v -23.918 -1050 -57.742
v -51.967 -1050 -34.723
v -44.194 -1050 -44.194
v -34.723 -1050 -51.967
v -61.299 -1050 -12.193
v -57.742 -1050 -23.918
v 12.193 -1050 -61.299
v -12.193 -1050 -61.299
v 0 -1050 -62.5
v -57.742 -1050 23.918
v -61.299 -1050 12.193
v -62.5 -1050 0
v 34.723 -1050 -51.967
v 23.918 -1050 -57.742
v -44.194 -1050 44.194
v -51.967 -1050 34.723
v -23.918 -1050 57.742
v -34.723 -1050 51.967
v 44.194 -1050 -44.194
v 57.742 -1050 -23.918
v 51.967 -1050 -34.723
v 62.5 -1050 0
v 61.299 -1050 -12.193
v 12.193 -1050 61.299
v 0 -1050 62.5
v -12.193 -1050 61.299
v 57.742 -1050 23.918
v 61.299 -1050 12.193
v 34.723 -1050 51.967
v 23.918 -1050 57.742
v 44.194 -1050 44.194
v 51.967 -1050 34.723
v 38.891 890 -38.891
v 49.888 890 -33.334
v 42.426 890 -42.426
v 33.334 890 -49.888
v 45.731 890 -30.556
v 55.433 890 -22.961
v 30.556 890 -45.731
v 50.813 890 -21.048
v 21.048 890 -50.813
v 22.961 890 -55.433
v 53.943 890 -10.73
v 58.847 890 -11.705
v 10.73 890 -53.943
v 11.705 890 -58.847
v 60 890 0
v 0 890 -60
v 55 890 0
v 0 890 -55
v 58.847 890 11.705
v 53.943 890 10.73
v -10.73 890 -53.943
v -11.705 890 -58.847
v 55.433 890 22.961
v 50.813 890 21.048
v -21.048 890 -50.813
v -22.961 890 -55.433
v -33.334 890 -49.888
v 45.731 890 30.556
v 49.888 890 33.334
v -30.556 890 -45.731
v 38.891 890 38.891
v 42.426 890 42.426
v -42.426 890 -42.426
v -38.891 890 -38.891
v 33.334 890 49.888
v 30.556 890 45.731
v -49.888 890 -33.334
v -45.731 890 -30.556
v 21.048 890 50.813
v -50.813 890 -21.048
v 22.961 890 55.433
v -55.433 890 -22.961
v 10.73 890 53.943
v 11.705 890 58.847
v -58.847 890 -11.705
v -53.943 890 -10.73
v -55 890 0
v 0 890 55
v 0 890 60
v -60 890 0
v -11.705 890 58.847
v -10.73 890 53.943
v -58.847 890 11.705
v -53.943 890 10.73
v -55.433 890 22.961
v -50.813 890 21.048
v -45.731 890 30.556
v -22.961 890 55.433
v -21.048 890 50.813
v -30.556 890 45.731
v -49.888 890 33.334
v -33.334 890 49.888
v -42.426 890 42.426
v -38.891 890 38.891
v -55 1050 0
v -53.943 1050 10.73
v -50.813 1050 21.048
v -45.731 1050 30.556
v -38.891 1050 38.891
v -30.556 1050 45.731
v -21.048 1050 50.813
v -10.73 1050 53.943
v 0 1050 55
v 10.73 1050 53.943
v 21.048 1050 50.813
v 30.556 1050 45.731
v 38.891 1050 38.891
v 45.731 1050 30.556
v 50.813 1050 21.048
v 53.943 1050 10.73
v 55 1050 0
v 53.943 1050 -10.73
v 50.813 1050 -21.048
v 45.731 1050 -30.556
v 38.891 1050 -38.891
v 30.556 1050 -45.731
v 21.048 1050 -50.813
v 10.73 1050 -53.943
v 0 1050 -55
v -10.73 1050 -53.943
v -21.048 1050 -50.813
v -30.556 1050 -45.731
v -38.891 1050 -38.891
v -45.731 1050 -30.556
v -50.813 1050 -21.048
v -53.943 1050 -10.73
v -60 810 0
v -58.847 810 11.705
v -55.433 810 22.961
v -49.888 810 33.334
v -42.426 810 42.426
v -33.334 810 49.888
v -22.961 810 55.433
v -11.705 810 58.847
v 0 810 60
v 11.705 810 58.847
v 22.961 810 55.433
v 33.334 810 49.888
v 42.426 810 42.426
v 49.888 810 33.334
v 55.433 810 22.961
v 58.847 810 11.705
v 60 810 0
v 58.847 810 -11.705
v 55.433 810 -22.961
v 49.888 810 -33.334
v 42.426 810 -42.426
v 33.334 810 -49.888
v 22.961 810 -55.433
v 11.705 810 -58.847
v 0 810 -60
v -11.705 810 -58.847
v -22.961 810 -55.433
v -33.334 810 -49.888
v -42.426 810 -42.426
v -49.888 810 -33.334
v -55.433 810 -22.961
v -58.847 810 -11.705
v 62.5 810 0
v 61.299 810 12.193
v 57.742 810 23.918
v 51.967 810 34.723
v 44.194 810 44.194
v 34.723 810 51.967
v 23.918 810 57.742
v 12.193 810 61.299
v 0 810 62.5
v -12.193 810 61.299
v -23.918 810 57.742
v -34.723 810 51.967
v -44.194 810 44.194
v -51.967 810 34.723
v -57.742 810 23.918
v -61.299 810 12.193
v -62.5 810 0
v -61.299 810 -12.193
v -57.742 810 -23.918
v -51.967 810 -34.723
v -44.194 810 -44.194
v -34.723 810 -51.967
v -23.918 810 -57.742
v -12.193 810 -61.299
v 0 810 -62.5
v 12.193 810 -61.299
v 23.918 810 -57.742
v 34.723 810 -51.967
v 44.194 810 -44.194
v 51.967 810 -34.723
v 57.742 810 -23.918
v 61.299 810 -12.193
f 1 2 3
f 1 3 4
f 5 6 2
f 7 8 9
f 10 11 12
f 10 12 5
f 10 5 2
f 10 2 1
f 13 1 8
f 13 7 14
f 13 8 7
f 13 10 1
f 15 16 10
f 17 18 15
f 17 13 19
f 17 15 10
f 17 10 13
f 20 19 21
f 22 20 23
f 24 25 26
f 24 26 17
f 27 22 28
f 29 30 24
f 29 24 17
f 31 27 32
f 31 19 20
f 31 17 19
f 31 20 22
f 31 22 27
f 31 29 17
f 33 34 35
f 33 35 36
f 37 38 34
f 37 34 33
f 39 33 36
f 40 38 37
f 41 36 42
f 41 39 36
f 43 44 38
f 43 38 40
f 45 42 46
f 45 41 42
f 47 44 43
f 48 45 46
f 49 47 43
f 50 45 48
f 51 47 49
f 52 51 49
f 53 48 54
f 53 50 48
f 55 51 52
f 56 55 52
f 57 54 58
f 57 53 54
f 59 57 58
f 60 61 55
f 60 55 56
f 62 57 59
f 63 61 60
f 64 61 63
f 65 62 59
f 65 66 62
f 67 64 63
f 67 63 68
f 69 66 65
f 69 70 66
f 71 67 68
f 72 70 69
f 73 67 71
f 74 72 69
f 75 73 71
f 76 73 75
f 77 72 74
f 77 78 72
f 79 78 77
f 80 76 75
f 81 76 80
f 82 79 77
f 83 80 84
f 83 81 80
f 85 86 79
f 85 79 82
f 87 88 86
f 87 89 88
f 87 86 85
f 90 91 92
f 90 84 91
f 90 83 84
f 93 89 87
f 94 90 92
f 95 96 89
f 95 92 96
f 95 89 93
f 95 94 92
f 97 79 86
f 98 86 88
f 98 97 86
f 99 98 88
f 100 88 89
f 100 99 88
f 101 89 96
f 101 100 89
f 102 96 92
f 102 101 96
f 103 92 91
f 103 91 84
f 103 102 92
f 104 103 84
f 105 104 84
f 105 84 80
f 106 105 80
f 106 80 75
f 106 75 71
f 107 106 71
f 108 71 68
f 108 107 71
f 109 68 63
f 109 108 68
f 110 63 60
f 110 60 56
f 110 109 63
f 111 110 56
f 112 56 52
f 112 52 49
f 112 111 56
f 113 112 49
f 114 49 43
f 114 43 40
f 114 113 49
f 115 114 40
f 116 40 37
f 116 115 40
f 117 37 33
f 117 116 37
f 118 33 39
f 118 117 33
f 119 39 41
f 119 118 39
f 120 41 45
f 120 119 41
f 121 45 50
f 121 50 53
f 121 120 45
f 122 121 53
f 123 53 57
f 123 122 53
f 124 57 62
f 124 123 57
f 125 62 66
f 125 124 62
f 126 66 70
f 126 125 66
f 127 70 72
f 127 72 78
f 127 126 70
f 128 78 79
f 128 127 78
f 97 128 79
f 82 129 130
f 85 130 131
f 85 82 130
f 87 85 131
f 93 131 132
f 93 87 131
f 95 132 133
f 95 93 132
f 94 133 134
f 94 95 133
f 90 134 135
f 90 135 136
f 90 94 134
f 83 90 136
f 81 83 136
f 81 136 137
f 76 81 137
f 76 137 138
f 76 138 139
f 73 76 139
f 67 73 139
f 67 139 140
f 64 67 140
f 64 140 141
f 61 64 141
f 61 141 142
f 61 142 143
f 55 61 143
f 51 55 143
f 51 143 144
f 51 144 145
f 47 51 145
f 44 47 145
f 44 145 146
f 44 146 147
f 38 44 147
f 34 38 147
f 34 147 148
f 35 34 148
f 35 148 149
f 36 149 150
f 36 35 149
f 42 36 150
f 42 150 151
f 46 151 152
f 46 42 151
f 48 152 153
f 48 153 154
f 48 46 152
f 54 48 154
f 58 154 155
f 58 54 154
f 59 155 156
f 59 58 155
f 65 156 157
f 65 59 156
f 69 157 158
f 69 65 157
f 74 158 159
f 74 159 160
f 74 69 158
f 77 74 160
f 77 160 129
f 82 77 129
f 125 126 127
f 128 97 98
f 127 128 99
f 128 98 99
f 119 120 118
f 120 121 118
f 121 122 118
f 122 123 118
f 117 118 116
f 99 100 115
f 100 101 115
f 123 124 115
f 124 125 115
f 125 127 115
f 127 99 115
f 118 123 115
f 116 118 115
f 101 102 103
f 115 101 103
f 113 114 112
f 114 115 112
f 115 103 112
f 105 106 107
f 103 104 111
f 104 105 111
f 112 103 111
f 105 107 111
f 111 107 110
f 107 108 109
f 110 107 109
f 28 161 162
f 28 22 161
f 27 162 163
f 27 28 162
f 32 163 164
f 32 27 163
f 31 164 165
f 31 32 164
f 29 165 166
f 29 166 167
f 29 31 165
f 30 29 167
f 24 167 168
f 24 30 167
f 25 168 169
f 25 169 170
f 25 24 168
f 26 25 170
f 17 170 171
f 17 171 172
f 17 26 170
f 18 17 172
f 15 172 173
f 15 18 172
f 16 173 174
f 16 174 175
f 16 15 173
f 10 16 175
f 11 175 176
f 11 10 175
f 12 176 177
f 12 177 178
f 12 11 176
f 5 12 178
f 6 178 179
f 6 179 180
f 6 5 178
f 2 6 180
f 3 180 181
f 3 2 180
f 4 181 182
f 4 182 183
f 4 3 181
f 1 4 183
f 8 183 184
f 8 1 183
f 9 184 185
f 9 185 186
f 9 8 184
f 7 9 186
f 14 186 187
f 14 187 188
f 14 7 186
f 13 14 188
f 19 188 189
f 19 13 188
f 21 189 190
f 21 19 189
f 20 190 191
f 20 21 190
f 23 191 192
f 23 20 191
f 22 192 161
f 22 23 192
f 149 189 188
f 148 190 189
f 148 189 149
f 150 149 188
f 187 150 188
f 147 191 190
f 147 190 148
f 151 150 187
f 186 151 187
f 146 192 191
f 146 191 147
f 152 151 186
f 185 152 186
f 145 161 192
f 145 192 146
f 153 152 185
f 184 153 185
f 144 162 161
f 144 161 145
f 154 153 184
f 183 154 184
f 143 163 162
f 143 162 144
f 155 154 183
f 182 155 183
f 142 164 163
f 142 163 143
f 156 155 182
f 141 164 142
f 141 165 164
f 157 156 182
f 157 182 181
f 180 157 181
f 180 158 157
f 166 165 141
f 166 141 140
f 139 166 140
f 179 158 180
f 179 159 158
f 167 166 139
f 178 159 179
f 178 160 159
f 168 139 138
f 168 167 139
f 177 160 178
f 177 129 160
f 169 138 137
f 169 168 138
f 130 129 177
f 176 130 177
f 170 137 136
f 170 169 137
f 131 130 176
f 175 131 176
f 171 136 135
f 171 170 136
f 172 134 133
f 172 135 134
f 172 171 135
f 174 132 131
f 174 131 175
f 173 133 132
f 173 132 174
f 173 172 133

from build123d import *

# Parameters (mm, degrees)
F0_R     = 62.5
F1_DEPTH = 1050
F2_R     = 62.5
F2_R_2   = 60
F3_DEPTH = 240
F2_R_3   = 55
F4_DEPTH = 160


with BuildPart() as f1:
    # F0 (on Front) → F1 (new body, symmetric)
    with BuildSketch(Plane.XZ):
        Circle(F0_R)
    extrude(amount=F1_DEPTH, both=True)

    # F2 (on face) → F3 (cut)
    with BuildSketch(Plane(origin=(0, 1050, 0), x_dir=(-1, 0, 0), z_dir=(0, 1, 0))):
        Circle(F2_R)
        Circle(F2_R_2, mode=Mode.SUBTRACT)
    extrude(amount=-F3_DEPTH, mode=Mode.SUBTRACT)

    # F2 (on face) → F4 (cut)
    with BuildSketch(Plane(origin=(0, 1050, 0), x_dir=(-1, 0, 0), z_dir=(0, 1, 0))):
        Circle(F2_R_2)
        Circle(F2_R_3, mode=Mode.SUBTRACT)
    extrude(amount=-F4_DEPTH, mode=Mode.SUBTRACT)


solid = f1.part
